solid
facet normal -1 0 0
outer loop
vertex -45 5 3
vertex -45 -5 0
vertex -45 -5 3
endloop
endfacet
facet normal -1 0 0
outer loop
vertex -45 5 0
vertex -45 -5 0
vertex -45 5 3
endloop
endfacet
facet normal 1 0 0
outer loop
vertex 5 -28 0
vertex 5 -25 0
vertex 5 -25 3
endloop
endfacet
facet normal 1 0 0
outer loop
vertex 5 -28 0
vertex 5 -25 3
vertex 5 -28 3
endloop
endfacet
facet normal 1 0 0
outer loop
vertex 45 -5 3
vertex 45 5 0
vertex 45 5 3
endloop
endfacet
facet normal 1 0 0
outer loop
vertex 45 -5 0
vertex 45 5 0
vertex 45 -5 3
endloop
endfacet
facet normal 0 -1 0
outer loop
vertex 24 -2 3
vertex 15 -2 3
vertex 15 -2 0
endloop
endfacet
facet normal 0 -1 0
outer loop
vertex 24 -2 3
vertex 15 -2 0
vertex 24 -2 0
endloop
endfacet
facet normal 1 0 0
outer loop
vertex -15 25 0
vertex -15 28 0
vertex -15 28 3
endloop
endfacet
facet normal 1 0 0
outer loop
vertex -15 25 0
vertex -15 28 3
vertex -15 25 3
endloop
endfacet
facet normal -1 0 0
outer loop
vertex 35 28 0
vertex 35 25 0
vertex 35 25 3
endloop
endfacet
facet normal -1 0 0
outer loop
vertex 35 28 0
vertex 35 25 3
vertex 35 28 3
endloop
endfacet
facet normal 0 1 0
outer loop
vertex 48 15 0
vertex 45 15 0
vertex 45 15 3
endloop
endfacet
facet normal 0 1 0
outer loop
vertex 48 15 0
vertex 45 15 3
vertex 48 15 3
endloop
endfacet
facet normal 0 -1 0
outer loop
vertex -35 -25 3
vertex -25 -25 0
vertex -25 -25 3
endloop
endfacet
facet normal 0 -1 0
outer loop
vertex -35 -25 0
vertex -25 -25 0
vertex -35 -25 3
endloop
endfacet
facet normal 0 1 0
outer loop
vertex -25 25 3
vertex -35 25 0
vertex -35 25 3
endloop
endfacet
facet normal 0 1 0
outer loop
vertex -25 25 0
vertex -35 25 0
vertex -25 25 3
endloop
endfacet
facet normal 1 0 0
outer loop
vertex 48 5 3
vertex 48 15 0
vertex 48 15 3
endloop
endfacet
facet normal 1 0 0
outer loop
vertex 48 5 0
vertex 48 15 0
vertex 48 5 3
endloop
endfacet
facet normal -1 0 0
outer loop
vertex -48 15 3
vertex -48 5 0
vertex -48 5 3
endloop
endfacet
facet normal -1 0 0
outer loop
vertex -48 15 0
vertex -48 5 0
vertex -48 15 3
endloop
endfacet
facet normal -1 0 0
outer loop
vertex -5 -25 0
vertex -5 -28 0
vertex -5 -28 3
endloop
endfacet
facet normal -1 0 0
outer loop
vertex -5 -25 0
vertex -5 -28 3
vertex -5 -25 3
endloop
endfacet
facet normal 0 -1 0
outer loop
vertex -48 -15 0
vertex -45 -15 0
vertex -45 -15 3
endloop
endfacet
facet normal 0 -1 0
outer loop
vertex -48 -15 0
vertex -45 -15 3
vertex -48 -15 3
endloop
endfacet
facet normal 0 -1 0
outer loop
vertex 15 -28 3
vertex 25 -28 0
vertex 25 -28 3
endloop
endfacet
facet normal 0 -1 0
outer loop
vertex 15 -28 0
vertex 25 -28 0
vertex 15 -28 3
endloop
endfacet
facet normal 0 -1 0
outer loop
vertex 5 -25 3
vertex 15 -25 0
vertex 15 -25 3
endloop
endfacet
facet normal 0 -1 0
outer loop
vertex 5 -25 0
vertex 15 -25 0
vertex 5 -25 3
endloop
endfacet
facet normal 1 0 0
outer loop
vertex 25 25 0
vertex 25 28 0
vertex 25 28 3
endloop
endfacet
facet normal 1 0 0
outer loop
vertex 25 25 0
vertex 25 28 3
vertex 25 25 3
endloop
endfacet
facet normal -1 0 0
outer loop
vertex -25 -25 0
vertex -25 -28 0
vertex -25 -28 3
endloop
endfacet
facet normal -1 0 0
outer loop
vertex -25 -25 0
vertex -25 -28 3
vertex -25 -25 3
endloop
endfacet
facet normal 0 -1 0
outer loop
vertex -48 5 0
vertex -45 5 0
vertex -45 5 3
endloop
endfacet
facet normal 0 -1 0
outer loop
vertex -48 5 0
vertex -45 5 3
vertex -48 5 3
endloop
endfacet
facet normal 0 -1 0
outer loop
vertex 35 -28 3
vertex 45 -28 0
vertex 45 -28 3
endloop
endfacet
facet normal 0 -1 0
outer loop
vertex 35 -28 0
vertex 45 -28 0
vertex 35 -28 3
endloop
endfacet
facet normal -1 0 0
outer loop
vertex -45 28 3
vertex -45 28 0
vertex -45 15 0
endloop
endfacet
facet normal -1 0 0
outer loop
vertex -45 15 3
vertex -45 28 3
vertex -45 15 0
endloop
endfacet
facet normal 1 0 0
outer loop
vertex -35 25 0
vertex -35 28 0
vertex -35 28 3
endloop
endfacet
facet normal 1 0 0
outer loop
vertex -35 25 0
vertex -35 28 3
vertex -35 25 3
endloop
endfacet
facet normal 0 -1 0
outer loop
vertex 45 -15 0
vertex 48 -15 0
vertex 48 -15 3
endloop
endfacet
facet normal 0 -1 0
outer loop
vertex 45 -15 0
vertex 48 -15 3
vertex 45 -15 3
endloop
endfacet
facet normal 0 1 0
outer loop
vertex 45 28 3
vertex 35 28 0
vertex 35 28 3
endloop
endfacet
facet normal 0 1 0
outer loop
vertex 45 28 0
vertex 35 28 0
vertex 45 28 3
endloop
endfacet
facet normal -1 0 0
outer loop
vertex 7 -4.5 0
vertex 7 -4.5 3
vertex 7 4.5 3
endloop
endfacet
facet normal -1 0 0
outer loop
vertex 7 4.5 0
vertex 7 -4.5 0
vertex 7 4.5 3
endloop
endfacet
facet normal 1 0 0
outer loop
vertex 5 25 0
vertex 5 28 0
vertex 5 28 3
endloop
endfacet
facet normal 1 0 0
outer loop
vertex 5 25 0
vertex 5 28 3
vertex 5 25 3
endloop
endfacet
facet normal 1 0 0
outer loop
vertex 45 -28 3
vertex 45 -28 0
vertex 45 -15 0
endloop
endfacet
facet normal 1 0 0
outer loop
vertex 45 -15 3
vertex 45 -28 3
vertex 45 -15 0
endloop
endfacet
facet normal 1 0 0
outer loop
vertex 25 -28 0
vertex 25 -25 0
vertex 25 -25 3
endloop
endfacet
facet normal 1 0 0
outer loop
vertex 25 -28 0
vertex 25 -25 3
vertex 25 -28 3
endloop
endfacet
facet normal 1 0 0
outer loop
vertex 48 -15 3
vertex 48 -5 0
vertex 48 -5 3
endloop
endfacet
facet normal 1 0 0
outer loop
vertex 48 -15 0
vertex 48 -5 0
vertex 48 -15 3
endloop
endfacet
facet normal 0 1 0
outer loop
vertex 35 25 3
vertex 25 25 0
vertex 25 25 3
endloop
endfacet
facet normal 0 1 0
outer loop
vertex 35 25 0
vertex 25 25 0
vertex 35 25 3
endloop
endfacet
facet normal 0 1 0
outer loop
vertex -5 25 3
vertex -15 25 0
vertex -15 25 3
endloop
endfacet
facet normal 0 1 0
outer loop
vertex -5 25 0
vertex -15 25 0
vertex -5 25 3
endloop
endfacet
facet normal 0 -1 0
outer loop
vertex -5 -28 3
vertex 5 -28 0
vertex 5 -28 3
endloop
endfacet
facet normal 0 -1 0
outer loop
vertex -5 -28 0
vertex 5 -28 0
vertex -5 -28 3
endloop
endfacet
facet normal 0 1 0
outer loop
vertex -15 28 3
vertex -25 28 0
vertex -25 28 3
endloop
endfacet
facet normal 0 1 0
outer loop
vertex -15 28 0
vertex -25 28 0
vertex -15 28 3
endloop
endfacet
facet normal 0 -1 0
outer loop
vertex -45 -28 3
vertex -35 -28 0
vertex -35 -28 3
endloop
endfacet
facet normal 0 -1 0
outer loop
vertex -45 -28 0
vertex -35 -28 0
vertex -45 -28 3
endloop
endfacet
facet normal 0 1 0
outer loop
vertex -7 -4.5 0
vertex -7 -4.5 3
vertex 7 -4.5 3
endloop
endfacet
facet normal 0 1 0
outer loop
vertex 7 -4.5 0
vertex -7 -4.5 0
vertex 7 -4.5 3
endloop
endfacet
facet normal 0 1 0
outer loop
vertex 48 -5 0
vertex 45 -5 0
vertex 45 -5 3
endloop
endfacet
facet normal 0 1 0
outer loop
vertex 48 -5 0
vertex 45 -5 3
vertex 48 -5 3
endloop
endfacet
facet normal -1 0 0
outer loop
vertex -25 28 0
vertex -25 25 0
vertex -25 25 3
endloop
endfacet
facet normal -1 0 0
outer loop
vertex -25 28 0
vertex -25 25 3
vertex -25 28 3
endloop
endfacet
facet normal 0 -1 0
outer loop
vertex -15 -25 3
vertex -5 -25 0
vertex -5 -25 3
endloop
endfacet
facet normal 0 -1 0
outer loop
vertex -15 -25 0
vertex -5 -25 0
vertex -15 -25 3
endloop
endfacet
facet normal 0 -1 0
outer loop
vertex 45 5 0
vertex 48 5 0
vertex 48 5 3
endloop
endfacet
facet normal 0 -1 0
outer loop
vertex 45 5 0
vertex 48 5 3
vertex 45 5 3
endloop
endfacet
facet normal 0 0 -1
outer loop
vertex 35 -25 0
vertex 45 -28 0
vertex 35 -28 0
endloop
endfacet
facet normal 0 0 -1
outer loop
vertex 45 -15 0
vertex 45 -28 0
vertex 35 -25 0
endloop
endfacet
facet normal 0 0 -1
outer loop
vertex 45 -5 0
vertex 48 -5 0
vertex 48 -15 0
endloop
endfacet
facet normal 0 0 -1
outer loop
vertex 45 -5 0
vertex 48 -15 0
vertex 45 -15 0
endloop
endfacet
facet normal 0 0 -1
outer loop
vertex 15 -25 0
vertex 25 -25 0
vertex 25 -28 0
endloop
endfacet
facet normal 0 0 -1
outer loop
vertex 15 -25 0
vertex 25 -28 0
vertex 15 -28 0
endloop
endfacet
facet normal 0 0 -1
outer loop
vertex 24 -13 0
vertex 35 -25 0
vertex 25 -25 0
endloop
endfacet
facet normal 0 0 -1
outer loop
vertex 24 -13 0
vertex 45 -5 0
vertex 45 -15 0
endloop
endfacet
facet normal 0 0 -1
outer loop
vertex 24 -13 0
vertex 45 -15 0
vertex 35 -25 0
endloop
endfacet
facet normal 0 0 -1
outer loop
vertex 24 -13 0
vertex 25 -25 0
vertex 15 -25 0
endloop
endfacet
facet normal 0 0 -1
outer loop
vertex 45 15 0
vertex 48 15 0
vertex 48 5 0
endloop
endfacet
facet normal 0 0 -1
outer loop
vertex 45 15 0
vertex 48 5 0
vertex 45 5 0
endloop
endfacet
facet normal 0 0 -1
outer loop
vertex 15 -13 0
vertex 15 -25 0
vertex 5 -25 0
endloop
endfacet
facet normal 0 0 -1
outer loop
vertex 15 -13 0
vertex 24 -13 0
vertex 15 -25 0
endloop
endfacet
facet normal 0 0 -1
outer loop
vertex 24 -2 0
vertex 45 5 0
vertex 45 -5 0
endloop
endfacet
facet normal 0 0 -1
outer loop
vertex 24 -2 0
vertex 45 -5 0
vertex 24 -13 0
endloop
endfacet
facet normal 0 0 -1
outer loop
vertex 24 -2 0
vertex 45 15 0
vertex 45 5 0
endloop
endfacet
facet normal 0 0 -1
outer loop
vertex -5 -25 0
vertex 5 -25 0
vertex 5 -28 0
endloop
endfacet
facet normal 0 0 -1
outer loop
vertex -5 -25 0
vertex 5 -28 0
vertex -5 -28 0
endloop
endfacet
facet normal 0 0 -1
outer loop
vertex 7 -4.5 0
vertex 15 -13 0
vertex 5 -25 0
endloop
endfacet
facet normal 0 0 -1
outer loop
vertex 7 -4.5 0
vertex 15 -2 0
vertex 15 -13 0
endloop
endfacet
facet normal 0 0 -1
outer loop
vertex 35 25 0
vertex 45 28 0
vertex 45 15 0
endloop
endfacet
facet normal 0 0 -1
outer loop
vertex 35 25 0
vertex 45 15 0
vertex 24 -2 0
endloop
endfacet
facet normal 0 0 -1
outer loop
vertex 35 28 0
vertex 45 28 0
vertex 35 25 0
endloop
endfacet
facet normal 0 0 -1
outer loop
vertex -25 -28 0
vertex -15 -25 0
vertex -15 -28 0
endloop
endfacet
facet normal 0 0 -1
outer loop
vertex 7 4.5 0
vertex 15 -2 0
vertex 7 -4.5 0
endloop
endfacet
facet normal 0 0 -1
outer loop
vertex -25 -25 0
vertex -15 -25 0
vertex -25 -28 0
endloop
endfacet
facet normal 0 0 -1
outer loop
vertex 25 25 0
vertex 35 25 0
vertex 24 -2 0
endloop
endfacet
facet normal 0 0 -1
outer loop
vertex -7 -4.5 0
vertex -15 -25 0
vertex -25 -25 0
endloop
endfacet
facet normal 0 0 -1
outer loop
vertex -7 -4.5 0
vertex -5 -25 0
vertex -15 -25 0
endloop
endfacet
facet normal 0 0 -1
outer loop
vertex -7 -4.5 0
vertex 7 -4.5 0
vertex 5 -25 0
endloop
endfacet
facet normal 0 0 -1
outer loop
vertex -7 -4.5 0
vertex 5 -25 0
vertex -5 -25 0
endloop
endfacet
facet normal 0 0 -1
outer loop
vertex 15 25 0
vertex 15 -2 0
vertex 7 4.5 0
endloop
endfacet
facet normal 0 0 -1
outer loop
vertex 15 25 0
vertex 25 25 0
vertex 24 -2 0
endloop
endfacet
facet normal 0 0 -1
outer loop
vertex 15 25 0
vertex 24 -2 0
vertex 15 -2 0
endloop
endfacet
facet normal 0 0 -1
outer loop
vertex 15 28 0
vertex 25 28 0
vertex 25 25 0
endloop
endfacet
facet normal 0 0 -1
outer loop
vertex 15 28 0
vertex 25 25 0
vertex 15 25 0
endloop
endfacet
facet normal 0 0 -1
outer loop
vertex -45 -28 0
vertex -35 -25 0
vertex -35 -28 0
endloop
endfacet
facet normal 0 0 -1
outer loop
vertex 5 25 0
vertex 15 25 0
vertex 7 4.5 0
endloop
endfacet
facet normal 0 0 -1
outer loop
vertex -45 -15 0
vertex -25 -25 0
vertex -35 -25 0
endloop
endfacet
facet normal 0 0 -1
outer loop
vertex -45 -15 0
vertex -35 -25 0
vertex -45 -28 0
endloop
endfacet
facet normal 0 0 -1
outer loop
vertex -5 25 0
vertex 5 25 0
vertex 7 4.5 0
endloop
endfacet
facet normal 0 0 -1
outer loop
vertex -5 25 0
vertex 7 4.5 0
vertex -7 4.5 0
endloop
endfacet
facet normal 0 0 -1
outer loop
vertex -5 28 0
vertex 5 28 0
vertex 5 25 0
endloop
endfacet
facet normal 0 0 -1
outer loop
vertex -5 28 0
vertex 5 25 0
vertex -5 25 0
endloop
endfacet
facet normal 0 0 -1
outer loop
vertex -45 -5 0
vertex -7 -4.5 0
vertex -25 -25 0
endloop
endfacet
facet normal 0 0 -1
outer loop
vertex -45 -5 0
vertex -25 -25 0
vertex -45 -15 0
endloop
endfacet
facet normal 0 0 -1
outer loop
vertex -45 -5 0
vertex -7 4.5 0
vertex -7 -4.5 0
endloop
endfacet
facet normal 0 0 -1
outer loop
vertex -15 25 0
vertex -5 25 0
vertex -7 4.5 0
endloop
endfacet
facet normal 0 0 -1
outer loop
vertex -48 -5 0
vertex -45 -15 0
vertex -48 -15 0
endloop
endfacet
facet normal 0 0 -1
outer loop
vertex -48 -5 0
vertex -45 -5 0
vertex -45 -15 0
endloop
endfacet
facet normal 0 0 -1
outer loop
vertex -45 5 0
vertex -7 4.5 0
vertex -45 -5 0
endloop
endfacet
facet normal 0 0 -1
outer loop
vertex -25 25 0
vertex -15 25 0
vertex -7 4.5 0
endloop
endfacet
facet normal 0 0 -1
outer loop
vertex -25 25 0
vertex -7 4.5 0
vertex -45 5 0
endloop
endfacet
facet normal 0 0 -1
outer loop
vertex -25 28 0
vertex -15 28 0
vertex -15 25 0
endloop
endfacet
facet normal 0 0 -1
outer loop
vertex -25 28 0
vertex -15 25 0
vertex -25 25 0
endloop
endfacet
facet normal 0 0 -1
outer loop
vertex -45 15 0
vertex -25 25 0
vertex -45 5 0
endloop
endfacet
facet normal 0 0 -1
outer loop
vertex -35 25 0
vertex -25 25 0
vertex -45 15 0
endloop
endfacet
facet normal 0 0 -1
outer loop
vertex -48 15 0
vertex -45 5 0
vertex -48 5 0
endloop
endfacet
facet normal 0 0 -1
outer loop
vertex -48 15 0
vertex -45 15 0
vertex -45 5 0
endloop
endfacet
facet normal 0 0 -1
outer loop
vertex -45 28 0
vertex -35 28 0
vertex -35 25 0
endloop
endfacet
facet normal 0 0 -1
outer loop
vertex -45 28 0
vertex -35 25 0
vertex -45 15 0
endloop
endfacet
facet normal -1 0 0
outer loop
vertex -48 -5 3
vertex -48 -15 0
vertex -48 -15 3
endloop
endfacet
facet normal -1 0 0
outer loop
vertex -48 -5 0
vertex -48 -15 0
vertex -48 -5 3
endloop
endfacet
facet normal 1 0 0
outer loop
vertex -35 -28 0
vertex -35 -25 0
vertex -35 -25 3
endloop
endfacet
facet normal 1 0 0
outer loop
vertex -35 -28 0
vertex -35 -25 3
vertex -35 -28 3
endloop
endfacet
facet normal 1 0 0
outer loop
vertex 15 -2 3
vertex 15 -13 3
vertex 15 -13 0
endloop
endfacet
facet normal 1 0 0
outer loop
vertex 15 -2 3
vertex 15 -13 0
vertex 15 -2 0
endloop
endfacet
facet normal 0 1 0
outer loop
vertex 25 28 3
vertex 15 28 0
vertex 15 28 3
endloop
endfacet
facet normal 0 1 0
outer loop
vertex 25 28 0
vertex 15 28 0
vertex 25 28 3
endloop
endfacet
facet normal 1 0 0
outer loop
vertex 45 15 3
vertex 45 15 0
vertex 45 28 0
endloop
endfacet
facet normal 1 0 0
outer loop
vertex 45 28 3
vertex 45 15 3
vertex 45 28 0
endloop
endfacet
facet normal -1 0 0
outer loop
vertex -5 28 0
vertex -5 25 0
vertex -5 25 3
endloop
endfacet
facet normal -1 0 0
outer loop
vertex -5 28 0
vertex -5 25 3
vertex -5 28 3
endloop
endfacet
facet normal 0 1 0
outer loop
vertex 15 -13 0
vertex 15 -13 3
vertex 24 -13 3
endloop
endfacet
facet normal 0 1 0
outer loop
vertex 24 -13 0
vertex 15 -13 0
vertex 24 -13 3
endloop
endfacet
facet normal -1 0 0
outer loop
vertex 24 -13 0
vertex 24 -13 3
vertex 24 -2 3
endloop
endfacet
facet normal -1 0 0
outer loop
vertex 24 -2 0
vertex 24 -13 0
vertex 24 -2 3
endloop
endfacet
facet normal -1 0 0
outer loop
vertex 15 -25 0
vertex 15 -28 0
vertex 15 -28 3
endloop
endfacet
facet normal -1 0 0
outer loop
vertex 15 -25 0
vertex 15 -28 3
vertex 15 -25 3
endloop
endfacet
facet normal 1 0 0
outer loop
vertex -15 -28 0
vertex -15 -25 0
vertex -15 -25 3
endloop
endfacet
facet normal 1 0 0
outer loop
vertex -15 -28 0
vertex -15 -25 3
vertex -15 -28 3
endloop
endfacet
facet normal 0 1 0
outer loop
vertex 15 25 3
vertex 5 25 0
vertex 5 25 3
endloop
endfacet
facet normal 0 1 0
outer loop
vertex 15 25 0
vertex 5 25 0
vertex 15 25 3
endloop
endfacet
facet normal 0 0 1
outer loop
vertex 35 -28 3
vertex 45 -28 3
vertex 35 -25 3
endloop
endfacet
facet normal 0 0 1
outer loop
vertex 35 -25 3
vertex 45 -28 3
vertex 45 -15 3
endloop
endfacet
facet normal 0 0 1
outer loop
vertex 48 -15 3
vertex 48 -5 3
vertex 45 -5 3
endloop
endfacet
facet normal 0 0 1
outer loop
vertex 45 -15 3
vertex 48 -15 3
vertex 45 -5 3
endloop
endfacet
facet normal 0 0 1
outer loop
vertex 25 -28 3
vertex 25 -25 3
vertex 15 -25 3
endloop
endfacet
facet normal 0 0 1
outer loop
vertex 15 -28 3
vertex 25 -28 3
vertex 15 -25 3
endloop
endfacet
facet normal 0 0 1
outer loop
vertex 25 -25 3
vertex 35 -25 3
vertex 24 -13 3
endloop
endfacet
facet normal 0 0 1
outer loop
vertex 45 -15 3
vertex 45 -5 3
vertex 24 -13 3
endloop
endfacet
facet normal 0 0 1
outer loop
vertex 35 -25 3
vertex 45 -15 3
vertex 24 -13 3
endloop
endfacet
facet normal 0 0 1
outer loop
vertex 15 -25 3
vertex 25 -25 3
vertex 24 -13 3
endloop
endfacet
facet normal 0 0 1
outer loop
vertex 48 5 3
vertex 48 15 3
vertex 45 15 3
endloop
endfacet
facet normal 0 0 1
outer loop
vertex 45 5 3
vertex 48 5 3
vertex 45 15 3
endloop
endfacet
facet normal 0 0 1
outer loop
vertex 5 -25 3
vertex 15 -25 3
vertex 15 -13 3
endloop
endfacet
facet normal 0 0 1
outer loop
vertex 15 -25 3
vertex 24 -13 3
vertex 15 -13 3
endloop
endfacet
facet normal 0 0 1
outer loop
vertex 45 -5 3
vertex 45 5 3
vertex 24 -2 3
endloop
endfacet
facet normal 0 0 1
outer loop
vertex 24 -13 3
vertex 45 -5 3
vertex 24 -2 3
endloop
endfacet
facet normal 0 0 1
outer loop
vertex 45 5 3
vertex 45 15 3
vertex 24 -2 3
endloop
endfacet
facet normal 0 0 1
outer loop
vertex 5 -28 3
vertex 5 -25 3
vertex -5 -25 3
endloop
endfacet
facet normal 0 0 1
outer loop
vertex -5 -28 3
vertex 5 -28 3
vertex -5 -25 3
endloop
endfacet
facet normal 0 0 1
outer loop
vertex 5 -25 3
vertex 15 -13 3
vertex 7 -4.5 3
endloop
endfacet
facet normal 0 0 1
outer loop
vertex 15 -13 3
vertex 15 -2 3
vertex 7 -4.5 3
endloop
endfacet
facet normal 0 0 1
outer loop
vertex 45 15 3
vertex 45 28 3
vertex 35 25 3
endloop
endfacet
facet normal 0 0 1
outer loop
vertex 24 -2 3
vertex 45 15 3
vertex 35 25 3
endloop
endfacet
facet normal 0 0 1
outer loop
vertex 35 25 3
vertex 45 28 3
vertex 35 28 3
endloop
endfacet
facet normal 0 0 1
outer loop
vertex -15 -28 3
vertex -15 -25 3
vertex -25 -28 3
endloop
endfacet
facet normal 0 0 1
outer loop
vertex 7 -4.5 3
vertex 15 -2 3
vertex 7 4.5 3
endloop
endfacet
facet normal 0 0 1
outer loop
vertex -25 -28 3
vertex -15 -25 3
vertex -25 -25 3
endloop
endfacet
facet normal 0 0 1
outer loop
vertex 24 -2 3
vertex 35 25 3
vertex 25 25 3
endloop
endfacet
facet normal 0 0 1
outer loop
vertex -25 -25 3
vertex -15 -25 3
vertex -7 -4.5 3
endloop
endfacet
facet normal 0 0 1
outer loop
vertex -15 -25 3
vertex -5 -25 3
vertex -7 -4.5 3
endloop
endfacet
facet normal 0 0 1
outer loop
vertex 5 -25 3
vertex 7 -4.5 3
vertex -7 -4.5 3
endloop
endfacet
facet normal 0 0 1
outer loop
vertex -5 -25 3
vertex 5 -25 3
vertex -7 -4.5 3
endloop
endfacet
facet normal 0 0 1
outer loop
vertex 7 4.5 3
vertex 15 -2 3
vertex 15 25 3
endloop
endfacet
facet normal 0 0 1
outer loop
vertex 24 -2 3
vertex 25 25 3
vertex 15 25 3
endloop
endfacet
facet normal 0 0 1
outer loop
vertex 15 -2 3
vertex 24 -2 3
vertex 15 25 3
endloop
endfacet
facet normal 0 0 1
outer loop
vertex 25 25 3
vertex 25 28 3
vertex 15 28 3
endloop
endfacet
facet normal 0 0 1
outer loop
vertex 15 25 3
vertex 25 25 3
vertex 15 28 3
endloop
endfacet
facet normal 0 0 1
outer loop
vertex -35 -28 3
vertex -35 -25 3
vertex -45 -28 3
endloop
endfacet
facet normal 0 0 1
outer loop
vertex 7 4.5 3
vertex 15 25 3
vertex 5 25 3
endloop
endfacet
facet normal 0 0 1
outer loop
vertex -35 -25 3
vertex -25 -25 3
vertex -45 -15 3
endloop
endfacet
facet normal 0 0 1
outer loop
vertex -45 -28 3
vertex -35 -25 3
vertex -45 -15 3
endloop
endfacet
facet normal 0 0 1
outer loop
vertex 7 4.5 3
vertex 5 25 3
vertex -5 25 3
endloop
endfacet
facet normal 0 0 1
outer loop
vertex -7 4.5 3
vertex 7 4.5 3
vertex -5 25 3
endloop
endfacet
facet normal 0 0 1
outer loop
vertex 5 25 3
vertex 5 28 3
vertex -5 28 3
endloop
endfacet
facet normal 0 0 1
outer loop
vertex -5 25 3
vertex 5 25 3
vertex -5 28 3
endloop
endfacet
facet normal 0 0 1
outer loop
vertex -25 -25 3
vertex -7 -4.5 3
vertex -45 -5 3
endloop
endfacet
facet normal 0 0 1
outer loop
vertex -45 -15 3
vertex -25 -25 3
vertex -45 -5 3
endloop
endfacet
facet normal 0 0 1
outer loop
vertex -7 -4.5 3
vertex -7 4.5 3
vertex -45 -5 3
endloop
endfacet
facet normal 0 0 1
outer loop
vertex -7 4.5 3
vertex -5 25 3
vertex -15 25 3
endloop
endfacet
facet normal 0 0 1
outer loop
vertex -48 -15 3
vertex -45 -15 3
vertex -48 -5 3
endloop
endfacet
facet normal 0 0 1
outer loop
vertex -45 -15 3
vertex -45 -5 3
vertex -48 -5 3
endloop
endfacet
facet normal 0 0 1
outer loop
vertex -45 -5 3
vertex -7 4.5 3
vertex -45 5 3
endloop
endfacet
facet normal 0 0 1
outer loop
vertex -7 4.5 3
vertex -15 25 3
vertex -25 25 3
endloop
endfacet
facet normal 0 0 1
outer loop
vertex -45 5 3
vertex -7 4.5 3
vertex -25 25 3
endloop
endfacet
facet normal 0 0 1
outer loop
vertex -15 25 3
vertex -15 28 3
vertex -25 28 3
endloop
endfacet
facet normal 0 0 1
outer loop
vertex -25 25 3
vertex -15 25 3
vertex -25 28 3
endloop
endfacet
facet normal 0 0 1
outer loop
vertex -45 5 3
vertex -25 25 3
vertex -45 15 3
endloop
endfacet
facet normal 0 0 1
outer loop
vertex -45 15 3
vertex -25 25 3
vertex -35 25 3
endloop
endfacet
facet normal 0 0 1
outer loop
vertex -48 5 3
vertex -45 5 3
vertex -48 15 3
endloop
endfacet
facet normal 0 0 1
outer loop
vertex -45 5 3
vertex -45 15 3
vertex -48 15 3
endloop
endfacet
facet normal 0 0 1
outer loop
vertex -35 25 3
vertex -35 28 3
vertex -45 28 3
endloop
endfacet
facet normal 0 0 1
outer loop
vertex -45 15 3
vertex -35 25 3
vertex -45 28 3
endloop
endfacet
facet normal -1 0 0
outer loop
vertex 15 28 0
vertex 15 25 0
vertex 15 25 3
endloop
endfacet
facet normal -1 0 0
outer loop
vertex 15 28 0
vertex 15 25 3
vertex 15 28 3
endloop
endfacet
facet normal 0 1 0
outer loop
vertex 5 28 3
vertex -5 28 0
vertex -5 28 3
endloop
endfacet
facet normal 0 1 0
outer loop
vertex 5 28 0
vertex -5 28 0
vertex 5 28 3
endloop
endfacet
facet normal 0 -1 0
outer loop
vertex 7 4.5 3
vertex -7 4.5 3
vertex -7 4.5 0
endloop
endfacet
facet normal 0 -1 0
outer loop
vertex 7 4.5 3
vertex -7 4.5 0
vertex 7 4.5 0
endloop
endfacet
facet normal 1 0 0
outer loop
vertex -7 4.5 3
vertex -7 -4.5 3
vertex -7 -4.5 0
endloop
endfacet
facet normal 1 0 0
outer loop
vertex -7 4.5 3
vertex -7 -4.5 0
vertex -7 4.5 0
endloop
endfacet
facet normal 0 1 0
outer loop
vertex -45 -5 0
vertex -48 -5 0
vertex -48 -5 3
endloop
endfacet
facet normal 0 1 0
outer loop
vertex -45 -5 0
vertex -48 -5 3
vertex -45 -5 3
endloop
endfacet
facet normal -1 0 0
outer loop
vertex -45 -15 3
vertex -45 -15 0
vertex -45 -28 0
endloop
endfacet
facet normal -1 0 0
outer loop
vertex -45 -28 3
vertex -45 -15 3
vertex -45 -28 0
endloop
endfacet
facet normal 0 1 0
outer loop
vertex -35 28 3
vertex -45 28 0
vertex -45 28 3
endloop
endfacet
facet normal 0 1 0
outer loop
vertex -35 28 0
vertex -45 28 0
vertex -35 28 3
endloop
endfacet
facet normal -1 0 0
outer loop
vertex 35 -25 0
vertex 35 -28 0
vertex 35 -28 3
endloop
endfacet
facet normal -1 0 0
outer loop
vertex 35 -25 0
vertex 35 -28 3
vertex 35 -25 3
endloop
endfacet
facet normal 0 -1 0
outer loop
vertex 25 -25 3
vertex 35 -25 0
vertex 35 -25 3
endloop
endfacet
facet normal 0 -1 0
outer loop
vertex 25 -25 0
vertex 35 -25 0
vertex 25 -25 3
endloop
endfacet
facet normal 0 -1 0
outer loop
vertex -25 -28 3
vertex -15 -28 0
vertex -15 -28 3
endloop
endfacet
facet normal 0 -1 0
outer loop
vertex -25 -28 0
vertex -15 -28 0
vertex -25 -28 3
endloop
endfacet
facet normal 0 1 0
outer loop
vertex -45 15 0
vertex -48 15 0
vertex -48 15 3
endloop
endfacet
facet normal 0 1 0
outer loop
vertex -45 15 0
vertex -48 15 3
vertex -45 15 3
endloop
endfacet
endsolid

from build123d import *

# Parameters (mm, degrees)
BOSS_EXTRUDE1_DEPTH = 3
SKETCH2_W           = 9
SKETCH2_H           = 11
CUT_EXTRUDE1_DEPTH  = 3
SKETCH3_W           = 14
SKETCH3_H           = 9
CUT_EXTRUDE2_DEPTH  = 3


with BuildPart() as part:
    # Sketch1 → Boss-Extrude1 (new body)
    with BuildSketch(Plane.XY):
        Polygon((25, 28), (25, 25), (35, 25), (35, 28), (45, 28), (45, 25), (45, 15), (48, 15), (48, 5), (45, 5), (45, -5), (48, -5), (48, -15), (45, -15), (45, -25), (45, -28), (35, -28), (35, -25), (25, -25), (25, -28), (15, -28), (15, -25), (5, -25), (5, -28), (-5, -28), (-5, -25), (-15, -25), (-15, -28), (-25, -28), (-25, -25), (-35, -25), (-35, -28), (-45, -28), (-45, -25), (-45, -15), (-48, -15), (-48, -5), (-45, -5), (-45, 5), (-48, 5), (-48, 15), (-45, 15), (-45, 25), (-45, 28), (-35, 28), (-35, 25), (-25, 25), (-25, 28), (-15, 28), (-15, 25), (-5, 25), (-5, 28), (5, 28), (5, 25), (15, 25), (15, 28), align=None)
    extrude(amount=BOSS_EXTRUDE1_DEPTH)

    # Sketch2 → Cut-Extrude1 (cut)
    with BuildSketch(Plane.XY.offset(3)):
        with Locations((19.5, -7.5)):
            Rectangle(SKETCH2_W, SKETCH2_H)
    extrude(amount=-CUT_EXTRUDE1_DEPTH, mode=Mode.SUBTRACT)

    # Sketch3 → Cut-Extrude2 (cut)
    with BuildSketch(Plane.XY.offset(3)):
        Rectangle(SKETCH3_W, SKETCH3_H)
    extrude(amount=-CUT_EXTRUDE2_DEPTH, mode=Mode.SUBTRACT)


solid = part.part
